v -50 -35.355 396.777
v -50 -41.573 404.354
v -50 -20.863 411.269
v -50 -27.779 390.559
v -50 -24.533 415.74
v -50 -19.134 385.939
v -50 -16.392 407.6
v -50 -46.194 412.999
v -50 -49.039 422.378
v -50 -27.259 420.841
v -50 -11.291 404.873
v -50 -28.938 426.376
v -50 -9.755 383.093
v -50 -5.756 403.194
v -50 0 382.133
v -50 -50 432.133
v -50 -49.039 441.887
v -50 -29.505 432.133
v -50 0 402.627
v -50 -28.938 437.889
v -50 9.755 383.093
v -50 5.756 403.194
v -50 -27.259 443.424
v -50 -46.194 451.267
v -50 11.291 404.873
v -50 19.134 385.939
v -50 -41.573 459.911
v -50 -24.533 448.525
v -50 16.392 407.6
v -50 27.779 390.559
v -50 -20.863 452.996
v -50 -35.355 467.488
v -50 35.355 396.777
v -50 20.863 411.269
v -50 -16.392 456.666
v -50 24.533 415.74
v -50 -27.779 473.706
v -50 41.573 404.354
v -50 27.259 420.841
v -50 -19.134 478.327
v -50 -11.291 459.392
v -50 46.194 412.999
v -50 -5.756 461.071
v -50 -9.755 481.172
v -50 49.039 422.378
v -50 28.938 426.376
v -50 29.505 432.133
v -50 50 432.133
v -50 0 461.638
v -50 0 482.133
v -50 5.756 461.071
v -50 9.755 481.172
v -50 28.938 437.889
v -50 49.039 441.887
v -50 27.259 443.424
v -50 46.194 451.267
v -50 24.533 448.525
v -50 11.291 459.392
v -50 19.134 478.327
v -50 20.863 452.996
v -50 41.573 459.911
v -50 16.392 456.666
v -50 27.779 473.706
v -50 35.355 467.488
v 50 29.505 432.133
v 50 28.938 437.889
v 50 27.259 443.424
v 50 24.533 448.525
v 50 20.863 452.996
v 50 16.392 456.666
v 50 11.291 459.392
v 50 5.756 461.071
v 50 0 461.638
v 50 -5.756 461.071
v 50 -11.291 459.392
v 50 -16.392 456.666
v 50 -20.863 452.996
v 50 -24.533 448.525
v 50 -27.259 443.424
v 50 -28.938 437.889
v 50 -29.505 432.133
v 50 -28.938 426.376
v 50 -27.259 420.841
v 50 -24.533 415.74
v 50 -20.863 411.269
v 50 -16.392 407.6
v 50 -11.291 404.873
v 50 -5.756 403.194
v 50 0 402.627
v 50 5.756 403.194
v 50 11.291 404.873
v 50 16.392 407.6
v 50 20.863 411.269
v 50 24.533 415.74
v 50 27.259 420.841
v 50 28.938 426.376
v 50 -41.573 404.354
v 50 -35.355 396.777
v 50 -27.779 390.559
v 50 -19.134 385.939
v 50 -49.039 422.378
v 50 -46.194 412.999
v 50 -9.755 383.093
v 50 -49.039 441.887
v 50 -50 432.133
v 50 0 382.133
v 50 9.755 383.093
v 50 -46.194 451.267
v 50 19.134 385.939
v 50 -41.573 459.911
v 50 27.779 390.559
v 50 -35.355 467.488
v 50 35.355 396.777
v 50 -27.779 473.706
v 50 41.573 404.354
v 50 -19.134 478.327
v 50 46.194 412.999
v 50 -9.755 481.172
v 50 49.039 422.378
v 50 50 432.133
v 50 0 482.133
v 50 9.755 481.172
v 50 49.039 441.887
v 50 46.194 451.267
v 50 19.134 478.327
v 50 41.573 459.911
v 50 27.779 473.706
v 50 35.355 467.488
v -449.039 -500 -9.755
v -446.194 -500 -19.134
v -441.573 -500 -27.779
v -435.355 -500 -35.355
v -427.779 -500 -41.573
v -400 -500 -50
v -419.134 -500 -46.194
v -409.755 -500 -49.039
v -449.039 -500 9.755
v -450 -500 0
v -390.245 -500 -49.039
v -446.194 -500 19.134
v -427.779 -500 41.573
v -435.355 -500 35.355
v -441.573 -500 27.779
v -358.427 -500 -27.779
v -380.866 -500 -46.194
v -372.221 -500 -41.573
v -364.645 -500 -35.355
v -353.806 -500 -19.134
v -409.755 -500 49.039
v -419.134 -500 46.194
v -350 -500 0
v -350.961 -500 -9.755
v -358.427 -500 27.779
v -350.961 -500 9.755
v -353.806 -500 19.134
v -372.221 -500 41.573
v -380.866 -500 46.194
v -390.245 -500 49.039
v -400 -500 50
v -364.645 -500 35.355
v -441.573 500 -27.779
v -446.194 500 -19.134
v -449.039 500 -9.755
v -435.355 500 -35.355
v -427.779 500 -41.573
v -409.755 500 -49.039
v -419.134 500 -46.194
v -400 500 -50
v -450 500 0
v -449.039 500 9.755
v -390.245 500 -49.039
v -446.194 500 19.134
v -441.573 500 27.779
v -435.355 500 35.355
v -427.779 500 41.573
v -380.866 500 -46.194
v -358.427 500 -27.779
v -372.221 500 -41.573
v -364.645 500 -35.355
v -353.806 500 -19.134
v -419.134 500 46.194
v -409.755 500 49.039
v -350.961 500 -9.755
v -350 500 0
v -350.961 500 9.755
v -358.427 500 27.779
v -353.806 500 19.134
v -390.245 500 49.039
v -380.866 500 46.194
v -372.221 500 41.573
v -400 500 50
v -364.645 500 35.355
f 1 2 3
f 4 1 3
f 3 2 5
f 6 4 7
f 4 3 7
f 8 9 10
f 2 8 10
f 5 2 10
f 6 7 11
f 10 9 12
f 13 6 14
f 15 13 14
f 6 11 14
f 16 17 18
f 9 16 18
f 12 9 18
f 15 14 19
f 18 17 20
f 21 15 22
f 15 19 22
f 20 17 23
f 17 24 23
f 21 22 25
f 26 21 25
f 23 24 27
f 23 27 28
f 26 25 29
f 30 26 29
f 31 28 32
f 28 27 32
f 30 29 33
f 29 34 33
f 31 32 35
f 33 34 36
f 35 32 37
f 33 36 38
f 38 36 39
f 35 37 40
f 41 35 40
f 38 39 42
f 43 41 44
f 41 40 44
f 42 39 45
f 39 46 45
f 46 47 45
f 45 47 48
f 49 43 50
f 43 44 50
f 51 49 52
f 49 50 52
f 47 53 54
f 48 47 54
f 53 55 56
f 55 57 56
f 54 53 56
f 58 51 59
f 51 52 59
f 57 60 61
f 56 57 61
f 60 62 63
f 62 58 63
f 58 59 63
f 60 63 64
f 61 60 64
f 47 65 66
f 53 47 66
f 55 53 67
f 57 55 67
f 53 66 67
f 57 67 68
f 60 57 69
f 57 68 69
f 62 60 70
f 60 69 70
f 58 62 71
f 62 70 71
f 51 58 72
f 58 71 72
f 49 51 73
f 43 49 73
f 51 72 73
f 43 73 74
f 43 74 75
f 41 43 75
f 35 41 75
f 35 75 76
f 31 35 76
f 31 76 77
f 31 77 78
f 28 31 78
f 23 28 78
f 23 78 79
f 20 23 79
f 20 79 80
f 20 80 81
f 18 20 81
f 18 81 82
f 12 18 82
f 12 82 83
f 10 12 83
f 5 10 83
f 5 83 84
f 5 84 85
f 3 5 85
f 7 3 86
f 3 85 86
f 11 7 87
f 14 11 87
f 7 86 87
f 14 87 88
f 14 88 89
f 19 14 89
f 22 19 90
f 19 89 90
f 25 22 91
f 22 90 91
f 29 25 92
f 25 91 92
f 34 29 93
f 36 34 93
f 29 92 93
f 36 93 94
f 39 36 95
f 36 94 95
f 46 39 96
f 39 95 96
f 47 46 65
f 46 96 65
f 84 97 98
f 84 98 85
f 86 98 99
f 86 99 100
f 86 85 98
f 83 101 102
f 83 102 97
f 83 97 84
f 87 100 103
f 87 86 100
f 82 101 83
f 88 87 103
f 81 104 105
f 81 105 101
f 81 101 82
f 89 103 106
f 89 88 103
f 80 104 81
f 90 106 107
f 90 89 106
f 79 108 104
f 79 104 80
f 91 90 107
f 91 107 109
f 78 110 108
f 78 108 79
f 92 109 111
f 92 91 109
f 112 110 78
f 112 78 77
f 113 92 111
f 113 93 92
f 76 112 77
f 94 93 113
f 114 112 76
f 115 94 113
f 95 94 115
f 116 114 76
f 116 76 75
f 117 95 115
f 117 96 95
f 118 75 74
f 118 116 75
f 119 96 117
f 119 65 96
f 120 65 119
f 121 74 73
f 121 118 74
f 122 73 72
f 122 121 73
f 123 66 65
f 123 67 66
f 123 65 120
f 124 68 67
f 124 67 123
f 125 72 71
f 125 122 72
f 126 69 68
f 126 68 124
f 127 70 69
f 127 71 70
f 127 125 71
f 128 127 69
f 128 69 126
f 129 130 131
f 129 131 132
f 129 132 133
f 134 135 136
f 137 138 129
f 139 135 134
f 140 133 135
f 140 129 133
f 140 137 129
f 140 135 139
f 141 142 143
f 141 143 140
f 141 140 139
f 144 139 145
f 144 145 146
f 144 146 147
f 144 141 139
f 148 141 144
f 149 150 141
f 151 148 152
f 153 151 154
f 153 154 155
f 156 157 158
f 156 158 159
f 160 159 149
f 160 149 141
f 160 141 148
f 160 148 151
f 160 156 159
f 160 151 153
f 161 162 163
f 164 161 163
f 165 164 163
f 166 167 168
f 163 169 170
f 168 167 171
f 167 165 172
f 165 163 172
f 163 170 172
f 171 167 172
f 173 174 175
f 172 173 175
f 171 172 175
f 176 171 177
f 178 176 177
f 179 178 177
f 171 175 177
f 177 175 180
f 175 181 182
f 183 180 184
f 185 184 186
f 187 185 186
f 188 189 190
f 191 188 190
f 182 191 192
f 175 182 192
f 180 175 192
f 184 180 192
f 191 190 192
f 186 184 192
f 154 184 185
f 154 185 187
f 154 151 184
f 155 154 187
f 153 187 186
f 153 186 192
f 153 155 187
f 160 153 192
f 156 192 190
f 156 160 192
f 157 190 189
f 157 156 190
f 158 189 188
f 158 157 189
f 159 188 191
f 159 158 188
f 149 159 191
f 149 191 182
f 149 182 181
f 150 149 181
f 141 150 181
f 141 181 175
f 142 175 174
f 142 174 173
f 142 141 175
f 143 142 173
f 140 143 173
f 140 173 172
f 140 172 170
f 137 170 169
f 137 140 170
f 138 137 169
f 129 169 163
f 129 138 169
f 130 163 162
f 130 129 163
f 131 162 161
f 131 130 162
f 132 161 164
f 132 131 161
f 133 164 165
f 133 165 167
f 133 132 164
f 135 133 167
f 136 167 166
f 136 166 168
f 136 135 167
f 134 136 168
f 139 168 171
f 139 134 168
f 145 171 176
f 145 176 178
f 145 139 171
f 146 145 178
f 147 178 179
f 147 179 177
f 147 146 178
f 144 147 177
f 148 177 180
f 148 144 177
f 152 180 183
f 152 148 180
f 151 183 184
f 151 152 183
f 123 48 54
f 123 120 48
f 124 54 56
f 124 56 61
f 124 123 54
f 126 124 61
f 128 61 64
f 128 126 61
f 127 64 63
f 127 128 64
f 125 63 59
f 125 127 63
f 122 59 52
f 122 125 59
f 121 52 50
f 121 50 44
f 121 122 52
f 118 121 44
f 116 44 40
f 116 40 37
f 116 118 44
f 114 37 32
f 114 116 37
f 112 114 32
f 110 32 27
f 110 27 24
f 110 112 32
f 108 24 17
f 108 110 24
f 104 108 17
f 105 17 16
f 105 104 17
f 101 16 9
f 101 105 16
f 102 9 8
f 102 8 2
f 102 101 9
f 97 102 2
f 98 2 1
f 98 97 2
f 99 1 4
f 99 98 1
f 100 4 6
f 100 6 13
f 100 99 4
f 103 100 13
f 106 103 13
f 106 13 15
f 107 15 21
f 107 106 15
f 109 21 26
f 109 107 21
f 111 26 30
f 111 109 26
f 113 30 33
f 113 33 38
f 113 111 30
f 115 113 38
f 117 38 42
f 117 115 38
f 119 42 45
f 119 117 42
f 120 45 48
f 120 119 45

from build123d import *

# Parameters (mm, degrees)
F0_R     = 50
F1_DEPTH = 500
F2_R     = 50
F3_DEPTH = 50
F4_R     = 29.505367
F5_DEPTH = 500.001


with BuildPart() as f1:
    # F0 (on Front) → F1 (new body, symmetric)
    with BuildSketch(Plane.XZ):
        with Locations((-400, 0)):
            Circle(F0_R)
    extrude(amount=F1_DEPTH, both=True)


with BuildPart() as f3:
    # F2 (on Right) → F3 (new body, symmetric)
    with BuildSketch(Plane.YZ):
        with Locations((0, 432.132691)):
            Circle(F2_R)
    extrude(amount=F3_DEPTH, both=True)

    # F4 (on face) → F5 (cut, through all)
    with BuildSketch(Plane.YZ.offset(50)):
        with Locations((0, 432.132691)):
            Circle(F4_R)
    extrude(amount=-F5_DEPTH, mode=Mode.SUBTRACT)


solid = Compound([f1.part, f3.part])
